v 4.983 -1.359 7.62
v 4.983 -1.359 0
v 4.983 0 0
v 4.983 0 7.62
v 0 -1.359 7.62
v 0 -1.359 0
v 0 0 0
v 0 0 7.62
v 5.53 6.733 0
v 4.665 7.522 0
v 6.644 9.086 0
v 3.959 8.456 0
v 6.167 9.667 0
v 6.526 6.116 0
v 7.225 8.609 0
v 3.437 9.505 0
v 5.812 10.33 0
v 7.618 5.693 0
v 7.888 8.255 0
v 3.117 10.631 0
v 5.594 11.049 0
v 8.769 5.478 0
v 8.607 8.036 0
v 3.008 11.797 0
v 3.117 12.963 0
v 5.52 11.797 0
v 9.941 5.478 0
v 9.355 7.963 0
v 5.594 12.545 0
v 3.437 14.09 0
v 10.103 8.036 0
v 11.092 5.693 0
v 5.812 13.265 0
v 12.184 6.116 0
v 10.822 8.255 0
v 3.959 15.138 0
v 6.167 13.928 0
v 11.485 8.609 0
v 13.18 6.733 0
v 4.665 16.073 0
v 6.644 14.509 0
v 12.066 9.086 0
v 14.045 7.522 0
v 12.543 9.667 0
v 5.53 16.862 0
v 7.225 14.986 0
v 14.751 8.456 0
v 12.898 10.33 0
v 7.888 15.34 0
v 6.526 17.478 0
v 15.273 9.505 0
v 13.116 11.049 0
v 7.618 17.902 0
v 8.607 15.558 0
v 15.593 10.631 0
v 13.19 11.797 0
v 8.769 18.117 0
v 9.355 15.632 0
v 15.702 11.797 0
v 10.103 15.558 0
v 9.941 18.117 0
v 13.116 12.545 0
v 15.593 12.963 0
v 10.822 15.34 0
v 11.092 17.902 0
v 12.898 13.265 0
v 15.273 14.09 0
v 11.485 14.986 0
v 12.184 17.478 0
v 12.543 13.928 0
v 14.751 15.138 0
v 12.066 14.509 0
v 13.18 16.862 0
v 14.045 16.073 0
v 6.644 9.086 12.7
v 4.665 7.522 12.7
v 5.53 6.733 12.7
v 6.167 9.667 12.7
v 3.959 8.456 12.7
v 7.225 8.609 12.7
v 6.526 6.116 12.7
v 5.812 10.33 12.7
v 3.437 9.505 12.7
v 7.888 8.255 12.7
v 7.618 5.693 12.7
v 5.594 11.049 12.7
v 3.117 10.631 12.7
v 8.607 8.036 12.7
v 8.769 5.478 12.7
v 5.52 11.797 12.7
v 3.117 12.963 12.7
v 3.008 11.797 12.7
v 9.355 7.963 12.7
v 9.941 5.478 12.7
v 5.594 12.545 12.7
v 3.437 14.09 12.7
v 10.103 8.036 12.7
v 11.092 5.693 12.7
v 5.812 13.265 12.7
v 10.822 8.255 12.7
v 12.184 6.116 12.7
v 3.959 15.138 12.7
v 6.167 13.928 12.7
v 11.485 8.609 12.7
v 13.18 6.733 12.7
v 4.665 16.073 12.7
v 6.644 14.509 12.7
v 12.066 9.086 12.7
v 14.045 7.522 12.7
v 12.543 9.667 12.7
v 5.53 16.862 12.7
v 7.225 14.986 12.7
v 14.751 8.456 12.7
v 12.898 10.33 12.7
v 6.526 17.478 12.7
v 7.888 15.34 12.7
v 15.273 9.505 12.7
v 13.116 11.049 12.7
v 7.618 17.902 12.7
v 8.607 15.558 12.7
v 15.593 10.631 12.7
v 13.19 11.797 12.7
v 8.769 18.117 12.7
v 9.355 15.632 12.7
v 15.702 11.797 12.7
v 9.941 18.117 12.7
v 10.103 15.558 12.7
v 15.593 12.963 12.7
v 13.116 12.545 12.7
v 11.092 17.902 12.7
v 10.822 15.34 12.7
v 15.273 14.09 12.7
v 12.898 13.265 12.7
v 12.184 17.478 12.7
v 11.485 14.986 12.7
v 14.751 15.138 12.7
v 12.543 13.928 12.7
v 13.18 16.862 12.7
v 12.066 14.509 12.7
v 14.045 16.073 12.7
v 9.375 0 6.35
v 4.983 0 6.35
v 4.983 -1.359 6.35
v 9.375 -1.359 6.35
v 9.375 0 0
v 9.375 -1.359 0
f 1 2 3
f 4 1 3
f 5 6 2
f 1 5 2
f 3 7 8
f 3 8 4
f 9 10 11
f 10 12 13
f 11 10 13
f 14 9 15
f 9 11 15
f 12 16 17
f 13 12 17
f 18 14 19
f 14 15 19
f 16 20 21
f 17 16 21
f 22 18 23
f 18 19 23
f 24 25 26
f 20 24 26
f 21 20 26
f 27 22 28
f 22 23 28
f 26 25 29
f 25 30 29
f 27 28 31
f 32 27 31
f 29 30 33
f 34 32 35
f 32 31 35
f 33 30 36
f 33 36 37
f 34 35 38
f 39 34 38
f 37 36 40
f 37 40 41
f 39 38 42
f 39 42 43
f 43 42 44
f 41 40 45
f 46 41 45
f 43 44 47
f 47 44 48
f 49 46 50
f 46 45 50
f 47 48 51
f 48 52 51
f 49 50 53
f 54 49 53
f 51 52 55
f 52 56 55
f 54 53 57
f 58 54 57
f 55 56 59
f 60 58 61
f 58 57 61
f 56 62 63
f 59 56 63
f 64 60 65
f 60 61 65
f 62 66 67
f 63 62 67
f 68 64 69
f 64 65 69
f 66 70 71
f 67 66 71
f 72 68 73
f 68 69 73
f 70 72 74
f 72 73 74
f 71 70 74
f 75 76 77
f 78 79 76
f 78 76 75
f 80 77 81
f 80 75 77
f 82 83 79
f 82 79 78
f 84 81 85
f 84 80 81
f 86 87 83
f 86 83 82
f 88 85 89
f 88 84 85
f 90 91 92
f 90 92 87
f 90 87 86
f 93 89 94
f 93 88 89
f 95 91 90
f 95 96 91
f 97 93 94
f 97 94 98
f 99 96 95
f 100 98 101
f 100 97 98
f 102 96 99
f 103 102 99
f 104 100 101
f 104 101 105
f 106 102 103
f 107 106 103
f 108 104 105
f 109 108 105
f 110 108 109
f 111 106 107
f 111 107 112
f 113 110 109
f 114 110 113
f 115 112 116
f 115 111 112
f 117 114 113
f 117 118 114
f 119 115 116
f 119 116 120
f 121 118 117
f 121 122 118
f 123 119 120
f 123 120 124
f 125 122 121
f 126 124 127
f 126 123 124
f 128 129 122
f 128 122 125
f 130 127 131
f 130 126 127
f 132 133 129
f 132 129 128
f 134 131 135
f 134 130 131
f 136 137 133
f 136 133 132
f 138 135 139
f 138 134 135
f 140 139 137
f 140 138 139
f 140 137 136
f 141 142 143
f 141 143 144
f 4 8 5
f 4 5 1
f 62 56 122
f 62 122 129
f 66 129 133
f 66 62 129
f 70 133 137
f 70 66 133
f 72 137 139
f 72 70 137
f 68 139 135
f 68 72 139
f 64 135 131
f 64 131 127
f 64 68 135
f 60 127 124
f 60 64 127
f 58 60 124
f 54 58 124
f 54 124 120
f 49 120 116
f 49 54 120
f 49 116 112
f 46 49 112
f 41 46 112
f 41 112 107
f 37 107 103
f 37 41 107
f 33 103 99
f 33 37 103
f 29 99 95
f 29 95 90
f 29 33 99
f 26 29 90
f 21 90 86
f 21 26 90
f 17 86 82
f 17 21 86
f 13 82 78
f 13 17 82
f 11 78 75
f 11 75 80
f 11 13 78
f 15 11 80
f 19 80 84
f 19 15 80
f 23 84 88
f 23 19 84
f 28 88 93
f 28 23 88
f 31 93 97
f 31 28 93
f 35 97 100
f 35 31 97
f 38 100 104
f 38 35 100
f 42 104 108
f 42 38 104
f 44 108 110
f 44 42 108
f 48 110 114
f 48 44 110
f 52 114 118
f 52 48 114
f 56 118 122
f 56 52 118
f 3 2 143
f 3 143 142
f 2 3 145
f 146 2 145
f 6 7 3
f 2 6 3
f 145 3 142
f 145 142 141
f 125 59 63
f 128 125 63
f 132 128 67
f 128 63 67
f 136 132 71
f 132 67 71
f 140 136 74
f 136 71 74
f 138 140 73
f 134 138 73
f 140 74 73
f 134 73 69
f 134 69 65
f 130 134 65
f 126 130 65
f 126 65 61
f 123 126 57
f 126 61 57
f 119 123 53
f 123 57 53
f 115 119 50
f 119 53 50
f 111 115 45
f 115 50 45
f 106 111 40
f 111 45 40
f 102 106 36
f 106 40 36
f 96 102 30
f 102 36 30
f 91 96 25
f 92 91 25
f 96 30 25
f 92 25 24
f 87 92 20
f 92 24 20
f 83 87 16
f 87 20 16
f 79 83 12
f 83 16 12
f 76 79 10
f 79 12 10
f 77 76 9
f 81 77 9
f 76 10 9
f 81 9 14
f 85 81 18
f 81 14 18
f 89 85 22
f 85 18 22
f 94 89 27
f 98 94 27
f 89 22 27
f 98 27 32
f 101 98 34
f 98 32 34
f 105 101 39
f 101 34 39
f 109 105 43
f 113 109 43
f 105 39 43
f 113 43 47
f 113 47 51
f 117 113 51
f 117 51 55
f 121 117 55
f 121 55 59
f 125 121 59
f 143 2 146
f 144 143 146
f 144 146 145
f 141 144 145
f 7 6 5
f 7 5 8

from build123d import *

# Parameters (mm, degrees)
F0_W     = 4.392329
F0_H     = 1.359405
F1_DEPTH = 6.35
F0_W_2   = 4.982502
F2_DEPTH = 7.62
F3_R     = 6.34651
F3_R_2   = 3.83461
F4_DEPTH = 12.7


with BuildPart() as f1:
    # F0 (on Top) → F1 (new body)
    with BuildSketch(Plane.XY):
        with Locations((7.178667, -0.679702)):
            Rectangle(F0_W, F0_H)
    extrude(amount=F1_DEPTH)


with BuildPart() as f2:
    # F0 (on Top) → F2 (new body)
    with BuildSketch(Plane.XY):
        with Locations((2.491251, -0.679702)):
            Rectangle(F0_W_2, F0_H)
    extrude(amount=F2_DEPTH)


with BuildPart() as f4:
    # F3 (on Top) → F4 (new body)
    with BuildSketch(Plane.XY):
        with Locations((9.354994, 11.797301)):
            Circle(F3_R)
        with Locations((9.354994, 11.797301)):
            Circle(F3_R_2, mode=Mode.SUBTRACT)
    extrude(amount=F4_DEPTH)


solid = Compound([f1.part, f2.part, f4.part])
